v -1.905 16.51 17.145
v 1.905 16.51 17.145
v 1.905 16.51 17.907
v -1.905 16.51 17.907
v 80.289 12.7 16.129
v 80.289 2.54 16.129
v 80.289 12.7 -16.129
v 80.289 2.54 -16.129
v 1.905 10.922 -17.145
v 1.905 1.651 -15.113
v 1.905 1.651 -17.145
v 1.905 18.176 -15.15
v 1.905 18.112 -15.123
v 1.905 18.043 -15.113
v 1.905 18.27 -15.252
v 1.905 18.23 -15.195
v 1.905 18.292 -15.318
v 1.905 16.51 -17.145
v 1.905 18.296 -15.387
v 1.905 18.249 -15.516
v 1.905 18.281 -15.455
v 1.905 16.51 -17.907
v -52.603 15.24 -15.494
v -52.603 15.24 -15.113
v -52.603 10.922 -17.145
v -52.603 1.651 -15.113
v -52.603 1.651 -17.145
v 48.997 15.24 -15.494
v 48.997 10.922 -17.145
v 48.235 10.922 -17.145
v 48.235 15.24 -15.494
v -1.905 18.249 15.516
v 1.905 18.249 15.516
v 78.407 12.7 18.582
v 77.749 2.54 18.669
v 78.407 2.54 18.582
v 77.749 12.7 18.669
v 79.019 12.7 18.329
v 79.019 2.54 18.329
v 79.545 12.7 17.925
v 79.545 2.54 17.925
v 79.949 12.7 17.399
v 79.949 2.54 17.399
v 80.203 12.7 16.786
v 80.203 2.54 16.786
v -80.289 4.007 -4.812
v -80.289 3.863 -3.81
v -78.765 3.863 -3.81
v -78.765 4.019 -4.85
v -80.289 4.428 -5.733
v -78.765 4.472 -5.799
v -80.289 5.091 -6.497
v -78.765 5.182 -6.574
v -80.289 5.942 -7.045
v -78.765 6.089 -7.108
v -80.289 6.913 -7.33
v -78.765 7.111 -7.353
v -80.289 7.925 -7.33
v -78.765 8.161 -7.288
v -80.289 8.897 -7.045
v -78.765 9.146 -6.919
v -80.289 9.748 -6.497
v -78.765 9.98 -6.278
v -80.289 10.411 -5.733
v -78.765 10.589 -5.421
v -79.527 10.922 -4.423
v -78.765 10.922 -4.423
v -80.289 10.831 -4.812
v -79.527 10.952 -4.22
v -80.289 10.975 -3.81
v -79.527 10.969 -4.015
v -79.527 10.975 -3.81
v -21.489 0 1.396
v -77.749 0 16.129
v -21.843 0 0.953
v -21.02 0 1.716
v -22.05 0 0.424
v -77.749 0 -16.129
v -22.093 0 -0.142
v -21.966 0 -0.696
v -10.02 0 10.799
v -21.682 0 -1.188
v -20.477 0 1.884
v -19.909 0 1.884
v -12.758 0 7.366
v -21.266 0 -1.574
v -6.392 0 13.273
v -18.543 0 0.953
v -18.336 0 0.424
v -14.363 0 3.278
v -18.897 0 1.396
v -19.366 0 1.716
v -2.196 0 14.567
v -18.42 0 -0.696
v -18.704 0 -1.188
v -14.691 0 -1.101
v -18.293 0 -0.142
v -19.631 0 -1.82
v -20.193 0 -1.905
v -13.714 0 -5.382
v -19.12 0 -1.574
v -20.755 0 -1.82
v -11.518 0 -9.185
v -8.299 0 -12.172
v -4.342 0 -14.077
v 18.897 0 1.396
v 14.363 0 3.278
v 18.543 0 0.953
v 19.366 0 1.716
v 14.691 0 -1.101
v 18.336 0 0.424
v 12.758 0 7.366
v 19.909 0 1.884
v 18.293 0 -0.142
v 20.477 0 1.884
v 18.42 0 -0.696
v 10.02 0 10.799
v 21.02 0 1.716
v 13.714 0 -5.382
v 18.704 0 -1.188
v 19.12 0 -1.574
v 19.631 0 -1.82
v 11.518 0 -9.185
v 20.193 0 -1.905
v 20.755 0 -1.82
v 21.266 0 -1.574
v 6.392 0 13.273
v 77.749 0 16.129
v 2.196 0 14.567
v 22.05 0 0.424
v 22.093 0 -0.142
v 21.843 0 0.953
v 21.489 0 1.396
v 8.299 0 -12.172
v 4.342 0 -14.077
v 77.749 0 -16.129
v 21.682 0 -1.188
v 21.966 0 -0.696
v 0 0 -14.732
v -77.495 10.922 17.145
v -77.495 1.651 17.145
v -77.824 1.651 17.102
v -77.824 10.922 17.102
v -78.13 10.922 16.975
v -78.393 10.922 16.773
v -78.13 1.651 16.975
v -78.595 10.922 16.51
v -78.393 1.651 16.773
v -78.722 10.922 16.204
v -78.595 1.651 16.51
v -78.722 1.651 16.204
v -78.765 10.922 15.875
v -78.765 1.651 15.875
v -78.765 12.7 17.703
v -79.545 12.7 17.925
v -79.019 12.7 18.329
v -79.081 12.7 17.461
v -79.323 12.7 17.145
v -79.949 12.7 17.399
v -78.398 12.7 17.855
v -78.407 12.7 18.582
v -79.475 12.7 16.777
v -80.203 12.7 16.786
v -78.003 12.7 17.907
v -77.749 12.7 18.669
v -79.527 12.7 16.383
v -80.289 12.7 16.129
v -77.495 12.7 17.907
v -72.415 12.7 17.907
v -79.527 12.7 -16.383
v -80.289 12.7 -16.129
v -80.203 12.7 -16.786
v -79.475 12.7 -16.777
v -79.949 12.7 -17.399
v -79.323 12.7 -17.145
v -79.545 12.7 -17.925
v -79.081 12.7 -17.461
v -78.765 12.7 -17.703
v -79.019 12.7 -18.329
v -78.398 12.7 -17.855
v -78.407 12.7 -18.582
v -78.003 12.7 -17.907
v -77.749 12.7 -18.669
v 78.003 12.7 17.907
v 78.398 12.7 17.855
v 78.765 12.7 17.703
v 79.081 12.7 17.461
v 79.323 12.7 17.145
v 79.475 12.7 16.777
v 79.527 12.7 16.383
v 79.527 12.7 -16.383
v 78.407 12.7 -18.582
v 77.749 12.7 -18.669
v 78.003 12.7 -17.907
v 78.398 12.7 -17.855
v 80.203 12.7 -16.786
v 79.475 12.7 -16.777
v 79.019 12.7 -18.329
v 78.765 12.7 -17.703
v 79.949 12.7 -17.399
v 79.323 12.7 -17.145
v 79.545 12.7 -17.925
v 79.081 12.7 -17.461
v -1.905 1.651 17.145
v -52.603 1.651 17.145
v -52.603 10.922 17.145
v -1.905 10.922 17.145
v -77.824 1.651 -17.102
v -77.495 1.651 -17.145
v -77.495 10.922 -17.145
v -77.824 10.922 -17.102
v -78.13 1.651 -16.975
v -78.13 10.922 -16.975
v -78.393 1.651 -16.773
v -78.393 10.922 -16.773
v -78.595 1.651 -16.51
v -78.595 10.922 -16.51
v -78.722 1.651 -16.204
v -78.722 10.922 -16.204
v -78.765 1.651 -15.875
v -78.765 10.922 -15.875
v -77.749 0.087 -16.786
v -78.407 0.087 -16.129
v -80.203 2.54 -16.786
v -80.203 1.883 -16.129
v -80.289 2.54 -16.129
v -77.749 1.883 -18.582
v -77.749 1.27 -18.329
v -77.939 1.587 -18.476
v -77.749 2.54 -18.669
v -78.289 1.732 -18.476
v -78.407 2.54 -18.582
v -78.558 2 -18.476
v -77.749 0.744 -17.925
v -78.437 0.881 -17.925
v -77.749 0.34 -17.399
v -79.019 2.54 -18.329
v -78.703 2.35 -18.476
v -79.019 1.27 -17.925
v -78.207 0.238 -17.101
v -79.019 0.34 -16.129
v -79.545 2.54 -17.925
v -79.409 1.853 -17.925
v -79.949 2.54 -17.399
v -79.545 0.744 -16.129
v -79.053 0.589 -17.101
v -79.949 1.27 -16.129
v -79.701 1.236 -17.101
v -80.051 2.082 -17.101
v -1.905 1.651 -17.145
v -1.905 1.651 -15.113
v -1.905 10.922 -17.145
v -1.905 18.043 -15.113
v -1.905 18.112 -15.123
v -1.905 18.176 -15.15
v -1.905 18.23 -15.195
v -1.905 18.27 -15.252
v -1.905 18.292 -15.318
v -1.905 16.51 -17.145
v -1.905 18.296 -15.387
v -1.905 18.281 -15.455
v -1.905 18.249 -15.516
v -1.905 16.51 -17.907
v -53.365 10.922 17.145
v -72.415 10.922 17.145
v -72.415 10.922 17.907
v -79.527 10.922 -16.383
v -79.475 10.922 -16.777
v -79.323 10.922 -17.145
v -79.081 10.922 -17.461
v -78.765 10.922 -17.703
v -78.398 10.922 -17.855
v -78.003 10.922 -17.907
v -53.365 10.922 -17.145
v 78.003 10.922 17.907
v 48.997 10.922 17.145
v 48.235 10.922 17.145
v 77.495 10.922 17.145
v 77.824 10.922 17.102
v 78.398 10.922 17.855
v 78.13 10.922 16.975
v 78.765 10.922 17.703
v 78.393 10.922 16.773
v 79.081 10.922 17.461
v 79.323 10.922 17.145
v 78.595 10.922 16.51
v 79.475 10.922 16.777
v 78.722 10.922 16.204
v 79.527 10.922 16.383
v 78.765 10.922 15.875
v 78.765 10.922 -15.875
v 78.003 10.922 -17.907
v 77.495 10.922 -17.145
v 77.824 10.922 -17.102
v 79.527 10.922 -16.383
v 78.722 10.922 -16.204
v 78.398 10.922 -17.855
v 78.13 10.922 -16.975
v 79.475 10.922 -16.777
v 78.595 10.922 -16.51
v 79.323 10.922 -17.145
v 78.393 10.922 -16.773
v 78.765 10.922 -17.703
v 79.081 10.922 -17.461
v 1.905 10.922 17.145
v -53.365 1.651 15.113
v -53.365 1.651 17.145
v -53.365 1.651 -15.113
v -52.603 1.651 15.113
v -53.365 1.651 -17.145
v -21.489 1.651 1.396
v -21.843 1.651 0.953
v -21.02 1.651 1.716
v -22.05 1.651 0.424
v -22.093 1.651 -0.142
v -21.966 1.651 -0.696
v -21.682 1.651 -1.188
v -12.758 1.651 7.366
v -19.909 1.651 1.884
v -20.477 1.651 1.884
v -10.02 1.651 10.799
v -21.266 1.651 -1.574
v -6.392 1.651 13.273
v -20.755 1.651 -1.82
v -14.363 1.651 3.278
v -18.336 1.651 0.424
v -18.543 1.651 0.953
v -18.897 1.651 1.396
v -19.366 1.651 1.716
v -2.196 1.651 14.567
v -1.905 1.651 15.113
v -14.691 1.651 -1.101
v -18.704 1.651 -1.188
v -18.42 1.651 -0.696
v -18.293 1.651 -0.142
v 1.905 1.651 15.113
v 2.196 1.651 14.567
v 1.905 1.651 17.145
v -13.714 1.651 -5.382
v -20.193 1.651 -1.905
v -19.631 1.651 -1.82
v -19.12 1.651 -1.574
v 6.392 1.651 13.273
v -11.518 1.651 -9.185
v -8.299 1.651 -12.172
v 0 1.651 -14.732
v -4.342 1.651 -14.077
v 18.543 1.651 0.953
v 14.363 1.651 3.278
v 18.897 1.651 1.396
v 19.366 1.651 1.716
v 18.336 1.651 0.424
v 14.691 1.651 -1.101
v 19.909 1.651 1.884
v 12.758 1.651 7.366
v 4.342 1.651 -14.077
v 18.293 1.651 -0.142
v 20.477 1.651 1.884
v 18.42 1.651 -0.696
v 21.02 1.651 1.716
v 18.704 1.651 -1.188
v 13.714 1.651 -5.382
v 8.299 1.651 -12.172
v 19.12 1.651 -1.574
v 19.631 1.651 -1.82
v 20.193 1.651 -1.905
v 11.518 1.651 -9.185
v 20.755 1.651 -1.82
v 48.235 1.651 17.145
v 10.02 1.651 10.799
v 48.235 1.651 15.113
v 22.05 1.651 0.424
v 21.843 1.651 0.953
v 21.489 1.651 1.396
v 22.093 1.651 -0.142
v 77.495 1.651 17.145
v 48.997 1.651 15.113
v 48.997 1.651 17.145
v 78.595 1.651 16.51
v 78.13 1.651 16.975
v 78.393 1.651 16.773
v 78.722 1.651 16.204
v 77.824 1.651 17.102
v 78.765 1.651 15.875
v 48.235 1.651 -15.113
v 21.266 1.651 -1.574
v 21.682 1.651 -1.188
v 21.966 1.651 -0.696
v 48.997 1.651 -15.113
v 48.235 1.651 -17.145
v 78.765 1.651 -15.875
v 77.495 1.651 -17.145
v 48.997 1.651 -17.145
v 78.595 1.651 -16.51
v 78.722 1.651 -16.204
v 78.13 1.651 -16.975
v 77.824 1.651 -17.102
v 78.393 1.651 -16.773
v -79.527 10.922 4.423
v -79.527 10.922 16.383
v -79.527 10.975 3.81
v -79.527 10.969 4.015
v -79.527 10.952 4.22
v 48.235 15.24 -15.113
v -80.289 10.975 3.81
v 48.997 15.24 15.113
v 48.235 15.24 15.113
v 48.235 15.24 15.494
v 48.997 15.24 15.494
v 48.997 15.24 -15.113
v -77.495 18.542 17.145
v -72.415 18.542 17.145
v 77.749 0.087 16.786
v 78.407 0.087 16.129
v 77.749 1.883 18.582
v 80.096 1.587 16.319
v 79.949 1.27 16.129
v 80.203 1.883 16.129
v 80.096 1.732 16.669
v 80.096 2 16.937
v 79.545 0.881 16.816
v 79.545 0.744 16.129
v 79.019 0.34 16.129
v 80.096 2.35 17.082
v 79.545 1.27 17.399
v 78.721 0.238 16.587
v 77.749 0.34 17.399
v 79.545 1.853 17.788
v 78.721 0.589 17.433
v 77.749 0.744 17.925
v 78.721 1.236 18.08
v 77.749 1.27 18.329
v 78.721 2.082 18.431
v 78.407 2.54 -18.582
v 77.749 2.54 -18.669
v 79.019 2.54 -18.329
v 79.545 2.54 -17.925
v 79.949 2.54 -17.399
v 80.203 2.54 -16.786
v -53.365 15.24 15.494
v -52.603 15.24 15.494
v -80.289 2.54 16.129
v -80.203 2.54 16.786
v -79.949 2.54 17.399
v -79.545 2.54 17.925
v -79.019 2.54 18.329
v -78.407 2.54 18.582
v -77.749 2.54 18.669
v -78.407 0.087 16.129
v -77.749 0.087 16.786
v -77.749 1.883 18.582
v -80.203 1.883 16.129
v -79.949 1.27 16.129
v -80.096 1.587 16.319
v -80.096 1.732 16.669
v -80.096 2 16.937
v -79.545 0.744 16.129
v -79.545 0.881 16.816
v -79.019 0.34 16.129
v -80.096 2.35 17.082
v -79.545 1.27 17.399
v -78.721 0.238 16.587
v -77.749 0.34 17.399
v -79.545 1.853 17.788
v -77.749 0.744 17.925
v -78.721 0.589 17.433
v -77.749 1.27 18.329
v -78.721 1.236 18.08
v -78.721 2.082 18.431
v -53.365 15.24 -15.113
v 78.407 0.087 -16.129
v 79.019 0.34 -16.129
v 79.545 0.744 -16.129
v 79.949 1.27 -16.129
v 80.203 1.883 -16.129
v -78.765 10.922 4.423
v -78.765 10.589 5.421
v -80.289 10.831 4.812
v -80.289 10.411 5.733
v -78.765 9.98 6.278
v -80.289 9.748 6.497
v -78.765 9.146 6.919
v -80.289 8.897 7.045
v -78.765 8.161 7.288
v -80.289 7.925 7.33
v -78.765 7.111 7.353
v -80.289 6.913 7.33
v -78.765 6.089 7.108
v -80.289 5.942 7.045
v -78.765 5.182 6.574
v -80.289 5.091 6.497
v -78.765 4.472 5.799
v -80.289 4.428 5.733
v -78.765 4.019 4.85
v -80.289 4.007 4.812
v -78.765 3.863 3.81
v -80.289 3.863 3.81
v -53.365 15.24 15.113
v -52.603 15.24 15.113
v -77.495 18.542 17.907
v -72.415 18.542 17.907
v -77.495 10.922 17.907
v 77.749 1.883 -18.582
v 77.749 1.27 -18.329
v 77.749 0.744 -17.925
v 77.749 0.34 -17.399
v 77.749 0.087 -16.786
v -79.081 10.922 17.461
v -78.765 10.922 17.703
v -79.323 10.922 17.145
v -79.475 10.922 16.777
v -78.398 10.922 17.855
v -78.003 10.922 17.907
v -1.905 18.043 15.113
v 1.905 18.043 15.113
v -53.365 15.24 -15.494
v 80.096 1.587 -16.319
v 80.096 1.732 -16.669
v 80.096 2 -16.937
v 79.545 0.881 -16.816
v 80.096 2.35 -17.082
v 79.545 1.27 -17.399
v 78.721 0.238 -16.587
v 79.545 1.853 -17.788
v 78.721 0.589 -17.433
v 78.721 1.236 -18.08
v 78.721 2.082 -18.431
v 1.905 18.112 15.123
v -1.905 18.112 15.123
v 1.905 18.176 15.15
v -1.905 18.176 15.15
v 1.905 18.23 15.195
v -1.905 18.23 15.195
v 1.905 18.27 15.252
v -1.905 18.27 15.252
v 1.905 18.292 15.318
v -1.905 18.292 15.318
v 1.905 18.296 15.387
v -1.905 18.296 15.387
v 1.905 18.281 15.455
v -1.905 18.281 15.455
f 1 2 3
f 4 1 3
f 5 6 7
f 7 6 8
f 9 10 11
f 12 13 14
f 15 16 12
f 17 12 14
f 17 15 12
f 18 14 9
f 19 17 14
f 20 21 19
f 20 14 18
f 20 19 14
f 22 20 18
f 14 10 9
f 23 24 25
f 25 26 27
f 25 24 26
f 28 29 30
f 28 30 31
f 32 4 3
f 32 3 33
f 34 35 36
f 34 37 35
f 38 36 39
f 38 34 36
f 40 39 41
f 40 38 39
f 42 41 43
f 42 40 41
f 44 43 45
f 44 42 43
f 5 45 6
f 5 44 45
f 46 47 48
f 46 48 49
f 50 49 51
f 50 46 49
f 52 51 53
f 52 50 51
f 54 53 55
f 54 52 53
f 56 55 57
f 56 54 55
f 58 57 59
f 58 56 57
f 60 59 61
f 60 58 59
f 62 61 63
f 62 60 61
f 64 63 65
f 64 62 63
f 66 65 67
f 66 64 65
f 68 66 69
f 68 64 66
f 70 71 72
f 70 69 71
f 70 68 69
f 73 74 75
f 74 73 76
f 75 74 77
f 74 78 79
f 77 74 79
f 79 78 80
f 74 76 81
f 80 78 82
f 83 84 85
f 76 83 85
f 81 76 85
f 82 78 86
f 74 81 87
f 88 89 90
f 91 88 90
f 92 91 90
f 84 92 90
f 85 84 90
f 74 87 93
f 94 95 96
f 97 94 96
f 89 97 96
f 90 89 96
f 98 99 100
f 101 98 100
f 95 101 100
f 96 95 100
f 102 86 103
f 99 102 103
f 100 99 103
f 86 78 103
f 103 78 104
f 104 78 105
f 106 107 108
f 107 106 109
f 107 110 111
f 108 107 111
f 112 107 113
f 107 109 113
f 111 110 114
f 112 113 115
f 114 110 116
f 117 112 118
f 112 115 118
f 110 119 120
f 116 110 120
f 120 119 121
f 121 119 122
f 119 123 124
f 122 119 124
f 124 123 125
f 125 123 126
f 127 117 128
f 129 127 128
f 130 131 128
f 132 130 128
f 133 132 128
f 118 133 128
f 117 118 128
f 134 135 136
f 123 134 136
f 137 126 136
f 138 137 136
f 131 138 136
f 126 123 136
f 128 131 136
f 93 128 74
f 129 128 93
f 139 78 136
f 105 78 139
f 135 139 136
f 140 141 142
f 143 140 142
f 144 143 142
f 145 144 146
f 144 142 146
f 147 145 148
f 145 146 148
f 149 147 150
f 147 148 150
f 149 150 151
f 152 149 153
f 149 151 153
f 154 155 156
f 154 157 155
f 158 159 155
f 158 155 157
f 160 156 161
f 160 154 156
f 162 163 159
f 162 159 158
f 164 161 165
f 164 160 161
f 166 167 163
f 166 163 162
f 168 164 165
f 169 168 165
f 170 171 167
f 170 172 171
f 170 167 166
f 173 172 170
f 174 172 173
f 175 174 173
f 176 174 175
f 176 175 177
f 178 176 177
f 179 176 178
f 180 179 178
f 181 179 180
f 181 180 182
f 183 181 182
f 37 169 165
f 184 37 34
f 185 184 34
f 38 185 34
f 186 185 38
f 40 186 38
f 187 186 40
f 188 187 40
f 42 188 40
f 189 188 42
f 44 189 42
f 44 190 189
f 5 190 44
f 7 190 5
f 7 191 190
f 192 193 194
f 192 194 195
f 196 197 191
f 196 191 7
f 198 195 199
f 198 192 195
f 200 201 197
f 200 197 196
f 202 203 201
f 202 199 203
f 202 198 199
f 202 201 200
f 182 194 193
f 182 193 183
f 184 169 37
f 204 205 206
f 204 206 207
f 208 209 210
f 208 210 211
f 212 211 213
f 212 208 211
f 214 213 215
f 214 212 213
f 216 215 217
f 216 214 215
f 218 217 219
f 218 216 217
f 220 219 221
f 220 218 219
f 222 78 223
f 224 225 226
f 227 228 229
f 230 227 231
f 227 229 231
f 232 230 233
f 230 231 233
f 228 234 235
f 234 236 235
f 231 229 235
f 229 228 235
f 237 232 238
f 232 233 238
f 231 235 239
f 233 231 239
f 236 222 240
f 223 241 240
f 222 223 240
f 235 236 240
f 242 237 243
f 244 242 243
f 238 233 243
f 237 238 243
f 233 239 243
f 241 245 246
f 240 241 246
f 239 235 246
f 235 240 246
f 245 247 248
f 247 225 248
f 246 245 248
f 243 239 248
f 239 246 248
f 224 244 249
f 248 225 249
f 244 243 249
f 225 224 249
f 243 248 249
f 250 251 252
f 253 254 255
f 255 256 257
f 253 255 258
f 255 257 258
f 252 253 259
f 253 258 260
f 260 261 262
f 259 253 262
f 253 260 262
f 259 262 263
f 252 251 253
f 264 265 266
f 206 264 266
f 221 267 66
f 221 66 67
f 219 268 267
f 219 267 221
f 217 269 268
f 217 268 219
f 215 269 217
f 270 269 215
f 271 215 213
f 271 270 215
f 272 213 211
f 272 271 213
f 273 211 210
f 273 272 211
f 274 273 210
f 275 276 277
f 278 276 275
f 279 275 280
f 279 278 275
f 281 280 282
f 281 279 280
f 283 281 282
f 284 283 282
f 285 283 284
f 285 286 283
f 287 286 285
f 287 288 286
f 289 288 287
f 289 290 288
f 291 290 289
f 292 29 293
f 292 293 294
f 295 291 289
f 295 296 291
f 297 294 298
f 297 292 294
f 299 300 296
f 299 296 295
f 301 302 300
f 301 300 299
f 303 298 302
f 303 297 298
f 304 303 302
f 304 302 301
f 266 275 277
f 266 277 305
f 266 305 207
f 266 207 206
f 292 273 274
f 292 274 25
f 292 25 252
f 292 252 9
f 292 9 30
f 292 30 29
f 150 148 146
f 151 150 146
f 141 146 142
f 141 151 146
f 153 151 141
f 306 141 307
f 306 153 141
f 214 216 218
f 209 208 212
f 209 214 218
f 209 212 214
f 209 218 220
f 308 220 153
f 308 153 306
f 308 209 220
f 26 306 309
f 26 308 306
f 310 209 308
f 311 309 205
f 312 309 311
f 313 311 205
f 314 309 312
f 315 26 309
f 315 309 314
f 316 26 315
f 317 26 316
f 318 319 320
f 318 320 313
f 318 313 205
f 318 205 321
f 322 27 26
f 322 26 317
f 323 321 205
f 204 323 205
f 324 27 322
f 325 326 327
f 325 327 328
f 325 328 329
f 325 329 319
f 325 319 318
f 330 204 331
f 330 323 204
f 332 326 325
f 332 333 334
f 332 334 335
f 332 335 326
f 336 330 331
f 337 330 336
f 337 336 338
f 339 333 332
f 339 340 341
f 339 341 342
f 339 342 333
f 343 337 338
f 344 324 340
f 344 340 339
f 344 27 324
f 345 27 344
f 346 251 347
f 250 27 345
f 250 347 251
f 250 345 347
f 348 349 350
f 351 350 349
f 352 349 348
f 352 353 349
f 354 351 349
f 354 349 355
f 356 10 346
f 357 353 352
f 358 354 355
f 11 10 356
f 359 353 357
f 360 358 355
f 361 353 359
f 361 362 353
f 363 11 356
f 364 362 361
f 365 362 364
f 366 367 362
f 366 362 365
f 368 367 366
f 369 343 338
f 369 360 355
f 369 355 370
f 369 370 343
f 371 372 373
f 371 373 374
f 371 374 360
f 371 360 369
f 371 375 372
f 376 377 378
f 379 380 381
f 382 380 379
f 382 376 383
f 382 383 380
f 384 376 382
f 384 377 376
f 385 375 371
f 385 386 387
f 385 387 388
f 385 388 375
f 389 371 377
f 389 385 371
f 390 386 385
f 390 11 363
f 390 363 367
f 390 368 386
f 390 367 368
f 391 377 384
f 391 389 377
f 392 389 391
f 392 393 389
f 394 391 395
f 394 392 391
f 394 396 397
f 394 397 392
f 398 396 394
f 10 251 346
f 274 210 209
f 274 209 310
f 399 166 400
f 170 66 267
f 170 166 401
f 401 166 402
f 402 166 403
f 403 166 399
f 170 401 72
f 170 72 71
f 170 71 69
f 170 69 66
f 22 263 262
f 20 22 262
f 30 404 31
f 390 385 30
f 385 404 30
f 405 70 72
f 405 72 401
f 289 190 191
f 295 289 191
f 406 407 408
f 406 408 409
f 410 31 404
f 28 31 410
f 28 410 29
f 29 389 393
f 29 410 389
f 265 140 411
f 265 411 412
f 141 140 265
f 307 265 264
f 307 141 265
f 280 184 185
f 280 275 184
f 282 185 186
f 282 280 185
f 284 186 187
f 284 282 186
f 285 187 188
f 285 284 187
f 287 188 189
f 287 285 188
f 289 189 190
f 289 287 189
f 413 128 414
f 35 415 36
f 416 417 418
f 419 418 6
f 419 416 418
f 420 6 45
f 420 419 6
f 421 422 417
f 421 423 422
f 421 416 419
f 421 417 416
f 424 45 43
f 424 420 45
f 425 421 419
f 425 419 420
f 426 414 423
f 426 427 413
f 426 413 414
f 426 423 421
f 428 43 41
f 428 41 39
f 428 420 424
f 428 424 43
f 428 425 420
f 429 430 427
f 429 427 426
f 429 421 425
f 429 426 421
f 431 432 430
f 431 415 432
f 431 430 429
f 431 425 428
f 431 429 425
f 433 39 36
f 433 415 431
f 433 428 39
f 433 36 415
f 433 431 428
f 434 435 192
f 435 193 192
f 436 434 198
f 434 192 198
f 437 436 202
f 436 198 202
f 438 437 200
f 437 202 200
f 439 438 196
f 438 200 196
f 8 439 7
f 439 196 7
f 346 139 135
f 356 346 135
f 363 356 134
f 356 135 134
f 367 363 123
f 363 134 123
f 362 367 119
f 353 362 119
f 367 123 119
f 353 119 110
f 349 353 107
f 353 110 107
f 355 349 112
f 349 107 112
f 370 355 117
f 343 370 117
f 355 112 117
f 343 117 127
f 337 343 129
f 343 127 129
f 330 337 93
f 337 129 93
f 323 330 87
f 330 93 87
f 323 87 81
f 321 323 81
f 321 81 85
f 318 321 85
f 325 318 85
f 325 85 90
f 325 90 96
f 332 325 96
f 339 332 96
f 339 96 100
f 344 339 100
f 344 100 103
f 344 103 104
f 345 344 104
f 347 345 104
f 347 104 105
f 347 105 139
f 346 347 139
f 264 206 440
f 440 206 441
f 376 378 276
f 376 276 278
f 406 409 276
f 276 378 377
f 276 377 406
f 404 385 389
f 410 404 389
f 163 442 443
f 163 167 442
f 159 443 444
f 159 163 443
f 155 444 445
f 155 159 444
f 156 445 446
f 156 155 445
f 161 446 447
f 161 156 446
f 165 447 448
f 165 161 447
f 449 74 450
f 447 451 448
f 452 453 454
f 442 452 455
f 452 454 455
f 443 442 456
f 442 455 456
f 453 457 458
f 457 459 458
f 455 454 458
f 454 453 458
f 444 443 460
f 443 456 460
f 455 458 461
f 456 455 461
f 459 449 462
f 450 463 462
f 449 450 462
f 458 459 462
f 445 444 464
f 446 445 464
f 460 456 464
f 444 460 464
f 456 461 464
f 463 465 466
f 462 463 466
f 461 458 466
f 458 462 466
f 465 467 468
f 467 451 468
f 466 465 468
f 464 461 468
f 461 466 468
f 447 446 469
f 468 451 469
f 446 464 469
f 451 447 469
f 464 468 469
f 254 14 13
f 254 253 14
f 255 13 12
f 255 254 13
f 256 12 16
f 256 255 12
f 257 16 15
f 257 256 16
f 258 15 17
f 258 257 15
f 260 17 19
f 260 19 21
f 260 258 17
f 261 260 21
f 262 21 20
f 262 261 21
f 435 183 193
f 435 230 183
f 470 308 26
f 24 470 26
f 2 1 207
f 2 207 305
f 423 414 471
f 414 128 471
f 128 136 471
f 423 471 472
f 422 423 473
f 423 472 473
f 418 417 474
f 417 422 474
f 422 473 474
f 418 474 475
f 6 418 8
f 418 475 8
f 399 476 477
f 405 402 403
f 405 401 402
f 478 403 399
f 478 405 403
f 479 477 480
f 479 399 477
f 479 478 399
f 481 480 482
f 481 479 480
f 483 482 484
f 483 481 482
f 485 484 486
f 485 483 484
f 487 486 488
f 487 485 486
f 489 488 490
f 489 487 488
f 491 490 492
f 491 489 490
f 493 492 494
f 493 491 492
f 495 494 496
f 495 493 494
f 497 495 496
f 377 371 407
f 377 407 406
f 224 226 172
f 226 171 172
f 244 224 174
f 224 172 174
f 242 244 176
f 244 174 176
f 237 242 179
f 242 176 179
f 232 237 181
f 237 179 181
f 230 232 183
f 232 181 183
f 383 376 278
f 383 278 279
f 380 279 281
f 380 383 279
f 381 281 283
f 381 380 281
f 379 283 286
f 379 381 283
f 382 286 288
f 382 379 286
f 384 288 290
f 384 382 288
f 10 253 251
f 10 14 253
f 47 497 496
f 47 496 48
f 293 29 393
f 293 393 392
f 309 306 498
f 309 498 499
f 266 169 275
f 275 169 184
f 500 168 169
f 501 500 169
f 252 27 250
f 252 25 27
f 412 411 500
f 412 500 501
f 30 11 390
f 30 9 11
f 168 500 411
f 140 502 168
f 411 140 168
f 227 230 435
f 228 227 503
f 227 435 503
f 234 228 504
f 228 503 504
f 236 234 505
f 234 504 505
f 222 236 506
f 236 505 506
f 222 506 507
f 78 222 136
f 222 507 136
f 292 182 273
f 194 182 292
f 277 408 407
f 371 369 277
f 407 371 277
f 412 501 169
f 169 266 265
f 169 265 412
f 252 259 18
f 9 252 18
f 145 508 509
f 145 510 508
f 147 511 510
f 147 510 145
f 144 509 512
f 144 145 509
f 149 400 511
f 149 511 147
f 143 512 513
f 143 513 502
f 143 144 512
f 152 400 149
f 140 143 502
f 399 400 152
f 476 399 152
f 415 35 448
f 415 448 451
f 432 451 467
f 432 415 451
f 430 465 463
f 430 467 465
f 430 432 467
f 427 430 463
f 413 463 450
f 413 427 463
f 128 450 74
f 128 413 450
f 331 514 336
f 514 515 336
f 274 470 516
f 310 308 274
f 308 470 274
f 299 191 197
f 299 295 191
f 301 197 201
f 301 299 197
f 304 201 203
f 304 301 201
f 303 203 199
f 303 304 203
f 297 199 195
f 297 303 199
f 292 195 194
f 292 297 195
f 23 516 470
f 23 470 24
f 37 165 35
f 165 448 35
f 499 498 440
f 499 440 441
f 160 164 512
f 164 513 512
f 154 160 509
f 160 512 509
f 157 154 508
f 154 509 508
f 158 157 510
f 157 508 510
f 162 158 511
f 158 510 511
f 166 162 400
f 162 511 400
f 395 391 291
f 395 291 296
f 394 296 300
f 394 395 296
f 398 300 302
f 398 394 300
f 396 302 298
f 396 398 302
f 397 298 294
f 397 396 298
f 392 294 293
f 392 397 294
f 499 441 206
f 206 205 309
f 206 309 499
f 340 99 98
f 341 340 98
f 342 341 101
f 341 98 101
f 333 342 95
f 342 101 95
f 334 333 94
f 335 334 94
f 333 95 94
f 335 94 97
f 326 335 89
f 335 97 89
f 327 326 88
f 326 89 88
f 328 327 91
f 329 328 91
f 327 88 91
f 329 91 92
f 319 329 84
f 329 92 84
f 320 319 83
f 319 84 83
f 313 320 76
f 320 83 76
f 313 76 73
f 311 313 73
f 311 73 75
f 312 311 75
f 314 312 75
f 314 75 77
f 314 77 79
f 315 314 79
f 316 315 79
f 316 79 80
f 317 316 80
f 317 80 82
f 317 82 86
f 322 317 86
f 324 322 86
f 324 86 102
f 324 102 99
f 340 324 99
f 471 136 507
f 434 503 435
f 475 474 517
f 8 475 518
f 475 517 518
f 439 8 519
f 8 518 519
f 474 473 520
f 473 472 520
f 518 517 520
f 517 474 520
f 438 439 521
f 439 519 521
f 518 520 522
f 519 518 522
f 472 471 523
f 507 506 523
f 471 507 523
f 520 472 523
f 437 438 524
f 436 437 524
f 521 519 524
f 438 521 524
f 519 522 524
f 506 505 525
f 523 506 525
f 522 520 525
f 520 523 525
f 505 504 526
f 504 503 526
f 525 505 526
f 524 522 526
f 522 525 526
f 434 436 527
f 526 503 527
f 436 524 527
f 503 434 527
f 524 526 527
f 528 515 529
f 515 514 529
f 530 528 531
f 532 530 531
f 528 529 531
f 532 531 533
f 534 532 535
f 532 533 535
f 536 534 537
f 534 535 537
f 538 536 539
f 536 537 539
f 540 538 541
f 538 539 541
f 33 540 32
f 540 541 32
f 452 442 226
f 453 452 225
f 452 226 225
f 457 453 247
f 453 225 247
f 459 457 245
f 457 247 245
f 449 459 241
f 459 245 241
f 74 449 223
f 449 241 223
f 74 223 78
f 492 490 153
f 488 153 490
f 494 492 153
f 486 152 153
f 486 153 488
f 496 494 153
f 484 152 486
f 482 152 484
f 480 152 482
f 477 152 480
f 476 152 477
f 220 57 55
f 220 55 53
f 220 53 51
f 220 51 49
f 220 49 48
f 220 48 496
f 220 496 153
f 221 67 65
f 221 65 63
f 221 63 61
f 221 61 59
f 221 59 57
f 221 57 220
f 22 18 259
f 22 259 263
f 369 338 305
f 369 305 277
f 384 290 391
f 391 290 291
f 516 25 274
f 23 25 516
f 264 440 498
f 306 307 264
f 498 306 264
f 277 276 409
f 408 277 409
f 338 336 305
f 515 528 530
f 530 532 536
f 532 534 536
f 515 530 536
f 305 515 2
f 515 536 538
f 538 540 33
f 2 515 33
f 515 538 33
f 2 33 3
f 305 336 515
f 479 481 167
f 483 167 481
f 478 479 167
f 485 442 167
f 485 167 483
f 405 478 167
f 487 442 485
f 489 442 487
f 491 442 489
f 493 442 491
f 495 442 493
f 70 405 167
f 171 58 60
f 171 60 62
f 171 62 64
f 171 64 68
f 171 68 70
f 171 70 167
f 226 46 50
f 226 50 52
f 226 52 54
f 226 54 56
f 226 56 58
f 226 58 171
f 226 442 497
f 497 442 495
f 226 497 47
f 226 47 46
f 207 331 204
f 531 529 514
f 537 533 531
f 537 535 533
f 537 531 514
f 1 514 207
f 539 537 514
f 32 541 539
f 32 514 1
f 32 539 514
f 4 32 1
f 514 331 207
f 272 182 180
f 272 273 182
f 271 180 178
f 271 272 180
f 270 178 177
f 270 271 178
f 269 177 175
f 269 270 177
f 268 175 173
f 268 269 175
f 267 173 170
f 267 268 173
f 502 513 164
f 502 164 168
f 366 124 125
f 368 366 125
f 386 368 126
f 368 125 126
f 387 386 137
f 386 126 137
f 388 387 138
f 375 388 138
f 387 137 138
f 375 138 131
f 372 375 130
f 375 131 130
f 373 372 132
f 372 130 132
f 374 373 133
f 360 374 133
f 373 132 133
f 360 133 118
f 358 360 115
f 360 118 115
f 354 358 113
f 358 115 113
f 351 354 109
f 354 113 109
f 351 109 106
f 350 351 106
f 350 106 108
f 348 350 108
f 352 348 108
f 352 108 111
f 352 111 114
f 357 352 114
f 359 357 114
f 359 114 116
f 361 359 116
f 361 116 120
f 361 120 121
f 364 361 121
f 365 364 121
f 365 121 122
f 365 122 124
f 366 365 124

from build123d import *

# Parameters (mm, degrees)
SKETCH1_W            = 160.5788
SKETCH1_H            = 37.338
BOSS_EXTRUDE1_DEPTH  = 12.7
SKETCH2_W            = 157.5308
SKETCH2_H            = 34.29
CUT_EXTRUDE3_DEPTH   = 11.049
FILLET1_R            = 2.54
FILLET2_R            = 1.27
CUT_EXTRUDE4_REACH   = 164.158
SKETCH4_W            = 159.0548
SKETCH4_H            = 35.814
CUT_EXTRUDE5_DEPTH   = 1.778
FILLET3_R            = 1.524
SKETCH5_W            = 5.08
SKETCH5_H            = 0.762
BOSS_EXTRUDE2_DEPTH  = 7.62
SKETCH6_W            = 0.762
SKETCH6_H            = 2.032
BOSS_EXTRUDE3_DEPTH  = 13.589
LPATTERN1_COUNT      = 2
LPATTERN1_PITCH      = 101.6
LPATTERN1_COUNT_DIR2 = 2
LPATTERN1_PITCH_DIR2 = 32.258
CUT_EXTRUDE6_REACH   = 133.936
SKETCH8_W            = 3.81
SKETCH8_H            = 2.032
BOSS_EXTRUDE4_DEPTH  = 14.859
BOSS_EXTRUDE9_DEPTH  = 3.81
FILLET4_R            = 0.254
FILLET4_OF_MIRROR2_R = 0.254
SKETCH10_R           = 14.732
SKETCH10_R_2         = 1.905
CUT_EXTRUDE7_DEPTH   = 85.490976307


with BuildPart() as part:
    # Sketch1 → Boss-Extrude1 (new body)
    with BuildSketch(Plane(origin=(0, 0, 0), x_dir=(1, 0, 0), z_dir=(0, 1, 0))):
        Rectangle(SKETCH1_W, SKETCH1_H)
    extrude(amount=BOSS_EXTRUDE1_DEPTH)

    # Sketch2 → Cut-Extrude3 (cut)
    with BuildSketch(Plane(origin=(0, 12.7, 0), x_dir=(1, 0, 0), z_dir=(0, 1, 0))):
        Rectangle(SKETCH2_W, SKETCH2_H)
    extrude(amount=-CUT_EXTRUDE3_DEPTH, mode=Mode.SUBTRACT)

    # Fillet1
    fillet1_edges = [part.edges().sort_by_distance(p)[0] for p in [
        (0, 0, 18.669),
        (-80.2894, 0, 0),
        (0, 0, -18.669),
        (80.2894, 0, 0),
        (80.2894, 6.35, 18.669),
        (-80.2894, 6.35, 18.669),
        (-80.2894, 6.35, -18.669),
        (80.2894, 6.35, -18.669),
    ]]
    fillet(fillet1_edges, radius=FILLET1_R)

    # Fillet2
    fillet2_edges = [part.edges().sort_by_distance(p)[0] for p in [
        (-78.7654, 7.1755, -17.145),
        (-78.7654, 7.1755, 17.145),
        (78.7654, 7.1755, 17.145),
        (78.7654, 7.1755, -17.145),
    ]]
    fillet(fillet2_edges, radius=FILLET2_R)

    # Sketch3 → Cut-Extrude4 (cut, up to next)
    with BuildSketch(Plane.ZY.offset(80.2894), mode=Mode.PRIVATE) as cut_extrude4_sk1:
        with BuildLine():
            Line((3.81, 3.8633146), (-3.81, 3.8633146))
            ThreePointArc((-3.81, 3.8633146), (-7.366, 7.4193146), (-3.81, 10.9753146))
            Line((-3.81, 10.9753146), (3.81, 10.9753146))
            ThreePointArc((3.81, 10.9753146), (7.366, 7.4193146), (3.81, 3.8633146))
        make_face()
    cut_extrude4_tool1 = extrude(cut_extrude4_sk1.sketch, amount=-CUT_EXTRUDE4_REACH, mode=Mode.PRIVATE) & part.part
    add(cut_extrude4_tool1.solids().sort_by_distance((-80.2894, 7.419315, 0))[0], mode=Mode.SUBTRACT)

    # Sketch4 → Cut-Extrude5 (cut)
    with BuildSketch(Plane(origin=(0, 12.7, 0), x_dir=(1, 0, 0), z_dir=(0, 1, 0))):
        Rectangle(SKETCH4_W, SKETCH4_H)
    extrude(amount=-CUT_EXTRUDE5_DEPTH, mode=Mode.SUBTRACT)

    # Fillet3
    fillet3_edges = [part.edges().sort_by_distance(p)[0] for p in [
        (-79.5274, 11.811, 17.907),
        (-79.5274, 11.811, -17.907),
        (79.5274, 11.811, -17.907),
        (79.5274, 11.811, 17.907),
    ]]
    fillet(fillet3_edges, radius=FILLET3_R)

    # Sketch5 → Boss-Extrude2 (add)
    with BuildSketch(Plane(origin=(0, 10.922, 0), x_dir=(1, 0, 0), z_dir=(0, 1, 0))):
        with Locations((-74.9554, -17.526)):
            Rectangle(SKETCH5_W, SKETCH5_H)
    extrude(amount=BOSS_EXTRUDE2_DEPTH)

    # Sketch6 → Boss-Extrude3 (add)
    with BuildSketch(Plane(origin=(0, 1.651, 0), x_dir=(1, 0, 0), z_dir=(0, 1, 0))):
        with Locations((-52.9844, 16.129)):
            Rectangle(SKETCH6_W, SKETCH6_H)
    boss_extrude3 = extrude(amount=BOSS_EXTRUDE3_DEPTH)

    # LPattern1: Boss-Extrude3 2 × 2
    with Locations(*[(i * LPATTERN1_PITCH, 0, j * LPATTERN1_PITCH_DIR2) for i in range(LPATTERN1_COUNT) for j in range(LPATTERN1_COUNT_DIR2) if (i, j) != (0, 0)]):
        add(boss_extrude3)

    # Cut-Extrude6: up to this face of the body (flat: up to its plane)
    cut_extrude6_end = Plane(part.part.faces().sort_by_distance((-53.3654, 8.4455, -16.129))[0])
    # Sketch7 → Cut-Extrude6 (cut, up to the picked face)
    with BuildSketch(Plane(origin=(48.9966, 0, 0), x_dir=(0, 0, -1), z_dir=(1, 0, 0)), mode=Mode.PRIVATE) as cut_extrude6_sk1:
        Polygon((17.145, 10.922), (15.494, 15.24), (17.145, 15.24), align=None)
    cut_extrude6_tool1 = split(extrude(cut_extrude6_sk1.sketch, amount=-CUT_EXTRUDE6_REACH, mode=Mode.PRIVATE), bisect_by=cut_extrude6_end, keep=Keep.BOTH, mode=Mode.PRIVATE)
    cut_extrude6 = cut_extrude6_tool1.solids().sort_by(Axis((48.9966, 13.800667, -16.594667), (-1, 0, 0)))[0]
    add(cut_extrude6, mode=Mode.SUBTRACT)

    # Mirror1: Cut-Extrude6 across plane
    add(cut_extrude6.mirror(Plane.XY), mode=Mode.SUBTRACT)

    # Sketch8 → Boss-Extrude4 (add)
    with BuildSketch(Plane(origin=(0, 1.651, 0), x_dir=(1, 0, 0), z_dir=(0, 1, 0))):
        with Locations((0, -16.129)):
            Rectangle(SKETCH8_W, SKETCH8_H)
        with Locations((0, 16.129)):
            Rectangle(SKETCH8_W, SKETCH8_H)
    extrude(amount=BOSS_EXTRUDE4_DEPTH)

    # Sketch9 → Boss-Extrude9 (add)
    with BuildSketch(Plane(origin=(1.905, 0, 0), x_dir=(0, 0, -1), z_dir=(1, 0, 0))):
        Polygon((-15.113, 16.51), (-17.907, 16.51), (-15.113, 18.542), align=None)
    boss_extrude9 = extrude(amount=-BOSS_EXTRUDE9_DEPTH)

    # Fillet4
    fillet4_edges = [part.edges().sort_by_distance(p)[0] for p in [
        (0, 18.542, 15.113),
    ]]
    fillet(fillet4_edges, radius=FILLET4_R)

    # Mirror2: Boss-Extrude9 across plane
    add(boss_extrude9.mirror(Plane.XY))

    # Fillet4 of Mirror2
    fillet4_of_mirror2_edges = [part.edges().sort_by_distance(p)[0] for p in [
        (0, 18.542, -15.113),
    ]]
    fillet(fillet4_of_mirror2_edges, radius=FILLET4_OF_MIRROR2_R)

    # Sketch10 → Cut-Extrude7 (cut, through all)
    with BuildSketch(Plane.XZ):
        with Locations(Location((0, 0, 0), (0, 0, 270))):
            Circle(SKETCH10_R)
        with Locations(Location((-20.193, 0, 0), (0, 0, 270))):
            Circle(SKETCH10_R_2)
        with Locations(Location((20.193, 0, 0), (0, 0, 270))):
            Circle(SKETCH10_R_2)
    extrude(amount=-CUT_EXTRUDE7_DEPTH, mode=Mode.SUBTRACT)


solid = part.part
